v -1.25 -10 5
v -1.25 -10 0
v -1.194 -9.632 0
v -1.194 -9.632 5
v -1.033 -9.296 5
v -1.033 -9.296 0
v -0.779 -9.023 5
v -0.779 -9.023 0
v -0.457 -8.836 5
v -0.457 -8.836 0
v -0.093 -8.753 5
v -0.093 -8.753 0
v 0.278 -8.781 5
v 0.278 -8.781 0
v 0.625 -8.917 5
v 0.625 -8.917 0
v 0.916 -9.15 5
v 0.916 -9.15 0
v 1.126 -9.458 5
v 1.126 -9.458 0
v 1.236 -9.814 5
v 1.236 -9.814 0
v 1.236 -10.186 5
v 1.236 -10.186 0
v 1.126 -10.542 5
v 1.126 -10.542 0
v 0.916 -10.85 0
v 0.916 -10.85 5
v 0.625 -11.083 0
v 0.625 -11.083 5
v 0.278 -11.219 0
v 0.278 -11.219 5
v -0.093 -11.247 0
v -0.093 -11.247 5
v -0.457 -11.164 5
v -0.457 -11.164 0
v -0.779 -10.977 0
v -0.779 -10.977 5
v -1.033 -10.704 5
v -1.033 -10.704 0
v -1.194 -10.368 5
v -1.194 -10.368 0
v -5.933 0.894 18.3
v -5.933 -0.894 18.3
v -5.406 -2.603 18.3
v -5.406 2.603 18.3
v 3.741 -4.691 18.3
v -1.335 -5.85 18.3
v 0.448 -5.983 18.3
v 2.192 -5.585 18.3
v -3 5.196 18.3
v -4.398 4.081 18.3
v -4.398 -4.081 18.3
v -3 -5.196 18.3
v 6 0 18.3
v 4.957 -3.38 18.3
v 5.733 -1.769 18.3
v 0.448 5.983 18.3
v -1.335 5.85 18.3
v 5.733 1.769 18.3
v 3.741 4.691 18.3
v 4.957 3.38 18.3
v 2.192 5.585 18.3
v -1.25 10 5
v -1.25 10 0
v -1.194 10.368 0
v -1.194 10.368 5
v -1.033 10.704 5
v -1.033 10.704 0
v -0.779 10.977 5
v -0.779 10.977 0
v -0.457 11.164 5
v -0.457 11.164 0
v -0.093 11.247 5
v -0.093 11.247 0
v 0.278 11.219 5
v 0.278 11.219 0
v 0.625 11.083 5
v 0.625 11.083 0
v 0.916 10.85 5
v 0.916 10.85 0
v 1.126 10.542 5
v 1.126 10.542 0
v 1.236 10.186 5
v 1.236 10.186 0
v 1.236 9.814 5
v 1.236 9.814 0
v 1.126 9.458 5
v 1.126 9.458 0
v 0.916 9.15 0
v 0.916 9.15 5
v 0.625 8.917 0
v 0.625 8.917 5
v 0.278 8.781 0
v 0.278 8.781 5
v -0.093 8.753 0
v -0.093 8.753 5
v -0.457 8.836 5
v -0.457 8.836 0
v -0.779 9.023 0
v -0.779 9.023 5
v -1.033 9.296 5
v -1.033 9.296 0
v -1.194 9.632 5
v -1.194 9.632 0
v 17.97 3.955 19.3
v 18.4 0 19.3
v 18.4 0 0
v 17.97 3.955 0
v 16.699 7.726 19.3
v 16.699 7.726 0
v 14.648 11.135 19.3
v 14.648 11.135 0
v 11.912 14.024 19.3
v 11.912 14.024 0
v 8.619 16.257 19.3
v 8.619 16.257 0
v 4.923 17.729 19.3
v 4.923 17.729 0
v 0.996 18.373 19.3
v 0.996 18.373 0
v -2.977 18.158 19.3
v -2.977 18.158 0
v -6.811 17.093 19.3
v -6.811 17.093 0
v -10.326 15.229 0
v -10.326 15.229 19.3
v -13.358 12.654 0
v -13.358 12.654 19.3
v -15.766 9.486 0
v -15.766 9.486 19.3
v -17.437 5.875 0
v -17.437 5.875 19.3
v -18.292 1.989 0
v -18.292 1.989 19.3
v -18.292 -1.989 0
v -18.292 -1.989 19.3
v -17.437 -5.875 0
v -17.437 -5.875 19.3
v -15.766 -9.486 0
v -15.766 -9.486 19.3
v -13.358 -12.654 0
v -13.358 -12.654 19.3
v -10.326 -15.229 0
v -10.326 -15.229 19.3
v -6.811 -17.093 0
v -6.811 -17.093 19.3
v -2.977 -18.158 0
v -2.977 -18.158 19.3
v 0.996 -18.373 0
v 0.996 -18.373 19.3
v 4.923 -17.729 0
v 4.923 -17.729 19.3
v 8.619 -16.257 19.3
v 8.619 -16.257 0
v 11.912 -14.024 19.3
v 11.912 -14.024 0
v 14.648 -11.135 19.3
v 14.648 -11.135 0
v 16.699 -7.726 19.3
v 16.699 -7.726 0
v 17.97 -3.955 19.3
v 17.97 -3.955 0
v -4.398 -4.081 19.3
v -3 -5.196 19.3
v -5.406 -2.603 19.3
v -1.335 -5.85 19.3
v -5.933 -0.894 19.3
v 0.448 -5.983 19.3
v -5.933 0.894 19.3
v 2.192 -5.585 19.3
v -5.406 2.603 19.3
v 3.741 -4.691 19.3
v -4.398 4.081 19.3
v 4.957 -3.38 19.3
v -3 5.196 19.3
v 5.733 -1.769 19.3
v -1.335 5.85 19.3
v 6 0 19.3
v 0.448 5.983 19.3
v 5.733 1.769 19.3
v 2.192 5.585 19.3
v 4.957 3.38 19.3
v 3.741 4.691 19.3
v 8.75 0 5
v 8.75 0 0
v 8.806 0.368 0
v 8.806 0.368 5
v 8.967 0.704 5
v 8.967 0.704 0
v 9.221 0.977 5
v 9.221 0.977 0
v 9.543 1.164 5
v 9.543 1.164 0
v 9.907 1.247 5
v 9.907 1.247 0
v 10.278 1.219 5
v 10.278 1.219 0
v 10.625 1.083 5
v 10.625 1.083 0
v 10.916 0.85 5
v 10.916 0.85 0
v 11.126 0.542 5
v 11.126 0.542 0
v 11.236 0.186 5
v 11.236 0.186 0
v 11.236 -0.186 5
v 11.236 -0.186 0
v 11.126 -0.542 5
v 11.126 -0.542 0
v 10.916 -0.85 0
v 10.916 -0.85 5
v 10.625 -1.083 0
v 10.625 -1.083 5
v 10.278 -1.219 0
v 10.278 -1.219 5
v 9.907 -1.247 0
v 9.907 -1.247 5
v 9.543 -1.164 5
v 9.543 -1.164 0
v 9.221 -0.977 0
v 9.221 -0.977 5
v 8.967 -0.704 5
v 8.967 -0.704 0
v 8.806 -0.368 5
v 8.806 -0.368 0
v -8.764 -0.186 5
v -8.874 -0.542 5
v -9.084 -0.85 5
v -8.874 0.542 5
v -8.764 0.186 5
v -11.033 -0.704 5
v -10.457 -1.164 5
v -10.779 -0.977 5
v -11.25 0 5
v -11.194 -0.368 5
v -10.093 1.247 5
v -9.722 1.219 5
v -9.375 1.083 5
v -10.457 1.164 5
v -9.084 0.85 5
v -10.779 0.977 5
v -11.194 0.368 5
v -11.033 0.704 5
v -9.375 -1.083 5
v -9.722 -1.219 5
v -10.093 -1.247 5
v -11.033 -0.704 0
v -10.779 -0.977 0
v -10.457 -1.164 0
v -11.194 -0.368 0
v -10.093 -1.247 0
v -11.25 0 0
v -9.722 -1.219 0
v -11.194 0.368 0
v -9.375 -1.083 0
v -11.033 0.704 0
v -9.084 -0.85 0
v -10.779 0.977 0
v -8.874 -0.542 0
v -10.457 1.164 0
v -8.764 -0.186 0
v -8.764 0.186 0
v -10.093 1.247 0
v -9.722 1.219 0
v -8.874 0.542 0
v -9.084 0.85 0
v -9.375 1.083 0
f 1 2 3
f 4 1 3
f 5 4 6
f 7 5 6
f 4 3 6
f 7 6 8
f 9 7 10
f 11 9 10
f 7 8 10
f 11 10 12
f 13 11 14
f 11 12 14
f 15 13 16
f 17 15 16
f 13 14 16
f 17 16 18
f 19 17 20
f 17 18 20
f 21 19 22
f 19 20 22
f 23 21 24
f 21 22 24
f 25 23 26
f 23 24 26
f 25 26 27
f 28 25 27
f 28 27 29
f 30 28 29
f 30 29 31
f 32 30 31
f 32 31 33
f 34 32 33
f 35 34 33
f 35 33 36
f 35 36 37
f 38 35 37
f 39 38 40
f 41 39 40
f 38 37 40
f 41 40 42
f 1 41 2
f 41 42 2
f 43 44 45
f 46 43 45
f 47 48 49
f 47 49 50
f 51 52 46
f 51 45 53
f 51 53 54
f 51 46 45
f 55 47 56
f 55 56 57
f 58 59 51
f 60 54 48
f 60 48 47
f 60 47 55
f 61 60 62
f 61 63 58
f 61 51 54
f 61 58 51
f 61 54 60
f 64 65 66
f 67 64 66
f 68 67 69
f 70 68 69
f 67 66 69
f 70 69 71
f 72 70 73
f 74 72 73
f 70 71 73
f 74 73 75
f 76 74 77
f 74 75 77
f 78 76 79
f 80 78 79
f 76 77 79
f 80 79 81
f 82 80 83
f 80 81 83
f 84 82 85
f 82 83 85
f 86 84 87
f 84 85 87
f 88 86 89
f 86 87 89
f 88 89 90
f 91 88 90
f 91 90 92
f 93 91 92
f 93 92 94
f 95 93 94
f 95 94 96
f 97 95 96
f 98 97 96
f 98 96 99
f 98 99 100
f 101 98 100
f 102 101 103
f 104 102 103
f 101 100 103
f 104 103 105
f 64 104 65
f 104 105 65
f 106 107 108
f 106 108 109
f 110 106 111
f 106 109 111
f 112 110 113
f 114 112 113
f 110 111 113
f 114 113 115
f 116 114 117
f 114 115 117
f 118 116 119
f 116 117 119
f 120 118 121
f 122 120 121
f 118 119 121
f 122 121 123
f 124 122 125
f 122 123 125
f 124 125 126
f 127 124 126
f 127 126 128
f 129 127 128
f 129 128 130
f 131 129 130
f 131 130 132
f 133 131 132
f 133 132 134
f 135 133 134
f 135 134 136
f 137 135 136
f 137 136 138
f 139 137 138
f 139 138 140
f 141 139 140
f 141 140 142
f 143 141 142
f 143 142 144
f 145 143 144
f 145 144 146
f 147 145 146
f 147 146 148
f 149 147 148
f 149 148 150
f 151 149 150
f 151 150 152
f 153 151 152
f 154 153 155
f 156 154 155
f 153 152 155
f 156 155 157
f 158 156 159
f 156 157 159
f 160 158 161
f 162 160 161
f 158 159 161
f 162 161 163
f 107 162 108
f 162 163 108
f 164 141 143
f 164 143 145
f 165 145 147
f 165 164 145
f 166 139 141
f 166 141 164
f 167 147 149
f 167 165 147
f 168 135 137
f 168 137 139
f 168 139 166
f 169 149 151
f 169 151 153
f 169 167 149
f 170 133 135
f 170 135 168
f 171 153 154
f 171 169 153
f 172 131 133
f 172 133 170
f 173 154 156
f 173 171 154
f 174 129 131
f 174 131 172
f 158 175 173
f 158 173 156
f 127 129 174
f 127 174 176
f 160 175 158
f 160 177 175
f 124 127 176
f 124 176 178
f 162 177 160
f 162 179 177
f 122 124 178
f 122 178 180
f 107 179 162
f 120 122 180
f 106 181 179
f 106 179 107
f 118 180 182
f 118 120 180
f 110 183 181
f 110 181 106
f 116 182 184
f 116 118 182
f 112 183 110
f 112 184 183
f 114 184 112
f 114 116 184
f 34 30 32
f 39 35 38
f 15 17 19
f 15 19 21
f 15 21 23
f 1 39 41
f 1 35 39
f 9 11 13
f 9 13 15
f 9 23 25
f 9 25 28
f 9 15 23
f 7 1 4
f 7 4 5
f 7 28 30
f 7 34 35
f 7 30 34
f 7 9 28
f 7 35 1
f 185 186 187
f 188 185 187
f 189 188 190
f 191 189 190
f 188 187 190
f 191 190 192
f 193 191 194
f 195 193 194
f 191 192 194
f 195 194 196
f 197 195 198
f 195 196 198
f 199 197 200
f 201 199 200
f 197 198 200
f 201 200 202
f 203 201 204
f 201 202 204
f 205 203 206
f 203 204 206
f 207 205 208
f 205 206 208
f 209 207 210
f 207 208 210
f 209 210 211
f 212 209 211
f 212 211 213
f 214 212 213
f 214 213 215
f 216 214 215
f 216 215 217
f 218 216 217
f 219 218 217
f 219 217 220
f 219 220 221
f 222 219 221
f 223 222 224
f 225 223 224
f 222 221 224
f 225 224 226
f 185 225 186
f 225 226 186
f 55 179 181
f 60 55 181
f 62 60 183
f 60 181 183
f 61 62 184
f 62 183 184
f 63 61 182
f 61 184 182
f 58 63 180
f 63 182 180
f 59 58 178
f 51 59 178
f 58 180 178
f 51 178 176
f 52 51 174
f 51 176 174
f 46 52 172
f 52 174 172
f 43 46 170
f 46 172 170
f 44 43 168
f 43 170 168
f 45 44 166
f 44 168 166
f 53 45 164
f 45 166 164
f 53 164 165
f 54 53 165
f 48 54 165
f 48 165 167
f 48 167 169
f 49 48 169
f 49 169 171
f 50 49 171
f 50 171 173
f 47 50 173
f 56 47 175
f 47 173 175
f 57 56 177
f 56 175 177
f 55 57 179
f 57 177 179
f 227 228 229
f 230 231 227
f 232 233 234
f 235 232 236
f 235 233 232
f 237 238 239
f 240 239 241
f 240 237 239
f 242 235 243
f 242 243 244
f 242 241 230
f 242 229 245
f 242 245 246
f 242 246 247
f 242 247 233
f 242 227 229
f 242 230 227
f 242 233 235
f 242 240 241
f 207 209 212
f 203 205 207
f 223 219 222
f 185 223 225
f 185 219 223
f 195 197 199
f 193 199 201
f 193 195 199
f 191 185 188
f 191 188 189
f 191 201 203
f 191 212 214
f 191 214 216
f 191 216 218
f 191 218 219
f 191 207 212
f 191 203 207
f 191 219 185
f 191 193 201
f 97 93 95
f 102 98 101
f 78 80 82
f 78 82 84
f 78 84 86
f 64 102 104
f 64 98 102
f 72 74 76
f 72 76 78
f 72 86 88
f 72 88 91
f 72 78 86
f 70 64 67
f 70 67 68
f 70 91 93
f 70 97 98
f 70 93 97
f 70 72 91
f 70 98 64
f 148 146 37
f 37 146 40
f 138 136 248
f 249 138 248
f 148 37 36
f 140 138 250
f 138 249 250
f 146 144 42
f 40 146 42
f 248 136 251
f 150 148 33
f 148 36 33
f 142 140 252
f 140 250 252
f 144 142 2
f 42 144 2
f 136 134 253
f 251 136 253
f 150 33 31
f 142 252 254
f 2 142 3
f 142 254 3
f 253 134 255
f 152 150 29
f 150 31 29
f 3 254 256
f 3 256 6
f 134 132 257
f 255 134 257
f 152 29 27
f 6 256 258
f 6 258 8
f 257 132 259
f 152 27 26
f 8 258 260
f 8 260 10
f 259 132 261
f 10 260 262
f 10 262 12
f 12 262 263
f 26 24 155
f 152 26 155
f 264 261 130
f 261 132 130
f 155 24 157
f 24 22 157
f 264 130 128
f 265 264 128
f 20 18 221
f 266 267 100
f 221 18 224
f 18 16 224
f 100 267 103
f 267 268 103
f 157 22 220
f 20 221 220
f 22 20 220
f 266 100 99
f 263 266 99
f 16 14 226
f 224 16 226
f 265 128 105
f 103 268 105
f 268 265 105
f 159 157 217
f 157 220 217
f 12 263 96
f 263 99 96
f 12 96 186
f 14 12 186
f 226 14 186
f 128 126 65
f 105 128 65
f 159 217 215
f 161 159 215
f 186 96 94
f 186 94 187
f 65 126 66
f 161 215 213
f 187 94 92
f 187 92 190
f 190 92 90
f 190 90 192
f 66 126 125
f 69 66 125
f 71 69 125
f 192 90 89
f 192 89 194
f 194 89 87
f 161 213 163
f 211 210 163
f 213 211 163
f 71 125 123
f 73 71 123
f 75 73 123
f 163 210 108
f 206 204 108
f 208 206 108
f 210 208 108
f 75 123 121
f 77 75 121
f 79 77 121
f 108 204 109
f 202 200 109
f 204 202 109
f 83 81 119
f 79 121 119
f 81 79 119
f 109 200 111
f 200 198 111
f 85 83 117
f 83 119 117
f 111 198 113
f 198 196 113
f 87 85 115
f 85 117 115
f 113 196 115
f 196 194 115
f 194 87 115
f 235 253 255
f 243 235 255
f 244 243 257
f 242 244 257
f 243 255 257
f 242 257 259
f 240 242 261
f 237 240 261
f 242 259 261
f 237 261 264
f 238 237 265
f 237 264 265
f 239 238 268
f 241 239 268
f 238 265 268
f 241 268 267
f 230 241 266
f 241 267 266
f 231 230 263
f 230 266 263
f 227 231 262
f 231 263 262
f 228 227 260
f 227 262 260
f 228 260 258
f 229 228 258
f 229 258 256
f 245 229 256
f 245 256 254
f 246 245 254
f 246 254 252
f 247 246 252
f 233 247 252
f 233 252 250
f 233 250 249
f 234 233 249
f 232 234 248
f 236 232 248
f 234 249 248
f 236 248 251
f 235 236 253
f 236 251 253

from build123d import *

# Parameters (mm, degrees)
CROQUIS1_R              = 18.4
SALIENTE_EXTRUIR1_DEPTH = 24.3
CROQUIS2_R              = 3
CROQUIS2_R_2            = 1.25
CORTAR_EXTRUIR1_DEPTH   = 5
CROQUIS3_R              = 1.25
CORTAR_EXTRUIR2_DEPTH   = 5
CORTAR_EXTRUIR3_START   = -5
CROQUIS6_R              = 18.4
CORTAR_EXTRUIR3_DEPTH   = 5
CROQUIS7_R              = 6
CORTAR_EXTRUIR4_DEPTH   = 1


with BuildPart() as part:
    # Croquis1 → Saliente-Extruir1 (new body)
    with BuildSketch(Plane.XY):
        Circle(CROQUIS1_R)
    extrude(amount=SALIENTE_EXTRUIR1_DEPTH)

    # Croquis2 → Cortar-Extruir1 (cut)
    with BuildSketch(Plane.XY.offset(24.3)):
        Circle(CROQUIS2_R)
        with Locations((0, 9.5)):
            Circle(CROQUIS2_R_2)
        with Locations((9.5, 0)):
            Circle(CROQUIS2_R_2)
        with Locations((0, -9.5)):
            Circle(CROQUIS2_R_2)
        with Locations((-9.5, 0)):
            Circle(CROQUIS2_R_2)
    extrude(amount=-CORTAR_EXTRUIR1_DEPTH, mode=Mode.SUBTRACT)

    # Croquis3 → Cortar-Extruir2 (cut)
    with BuildSketch(Plane(origin=(0, 0, 0), x_dir=(-1, 0, 0), z_dir=(0, 0, -1))):
        with Locations((-10, 0)):
            Circle(CROQUIS3_R)
        with Locations((0, 10)):
            Circle(CROQUIS3_R)
        with Locations((10, 0)):
            Circle(CROQUIS3_R)
        with Locations((0, -10)):
            Circle(CROQUIS3_R)
    extrude(amount=-CORTAR_EXTRUIR2_DEPTH, mode=Mode.SUBTRACT)

    # Croquis6 → Cortar-Extruir3 (cut)
    with BuildSketch(Plane.XY.offset(24.3).offset(CORTAR_EXTRUIR3_START)):
        Circle(CROQUIS6_R)
    extrude(amount=CORTAR_EXTRUIR3_DEPTH, mode=Mode.SUBTRACT)

    # Croquis7 → Cortar-Extruir4 (cut)
    with BuildSketch(Plane.XY.offset(19.3)):
        Circle(CROQUIS7_R)
    extrude(amount=-CORTAR_EXTRUIR4_DEPTH, mode=Mode.SUBTRACT)


solid = part.part
